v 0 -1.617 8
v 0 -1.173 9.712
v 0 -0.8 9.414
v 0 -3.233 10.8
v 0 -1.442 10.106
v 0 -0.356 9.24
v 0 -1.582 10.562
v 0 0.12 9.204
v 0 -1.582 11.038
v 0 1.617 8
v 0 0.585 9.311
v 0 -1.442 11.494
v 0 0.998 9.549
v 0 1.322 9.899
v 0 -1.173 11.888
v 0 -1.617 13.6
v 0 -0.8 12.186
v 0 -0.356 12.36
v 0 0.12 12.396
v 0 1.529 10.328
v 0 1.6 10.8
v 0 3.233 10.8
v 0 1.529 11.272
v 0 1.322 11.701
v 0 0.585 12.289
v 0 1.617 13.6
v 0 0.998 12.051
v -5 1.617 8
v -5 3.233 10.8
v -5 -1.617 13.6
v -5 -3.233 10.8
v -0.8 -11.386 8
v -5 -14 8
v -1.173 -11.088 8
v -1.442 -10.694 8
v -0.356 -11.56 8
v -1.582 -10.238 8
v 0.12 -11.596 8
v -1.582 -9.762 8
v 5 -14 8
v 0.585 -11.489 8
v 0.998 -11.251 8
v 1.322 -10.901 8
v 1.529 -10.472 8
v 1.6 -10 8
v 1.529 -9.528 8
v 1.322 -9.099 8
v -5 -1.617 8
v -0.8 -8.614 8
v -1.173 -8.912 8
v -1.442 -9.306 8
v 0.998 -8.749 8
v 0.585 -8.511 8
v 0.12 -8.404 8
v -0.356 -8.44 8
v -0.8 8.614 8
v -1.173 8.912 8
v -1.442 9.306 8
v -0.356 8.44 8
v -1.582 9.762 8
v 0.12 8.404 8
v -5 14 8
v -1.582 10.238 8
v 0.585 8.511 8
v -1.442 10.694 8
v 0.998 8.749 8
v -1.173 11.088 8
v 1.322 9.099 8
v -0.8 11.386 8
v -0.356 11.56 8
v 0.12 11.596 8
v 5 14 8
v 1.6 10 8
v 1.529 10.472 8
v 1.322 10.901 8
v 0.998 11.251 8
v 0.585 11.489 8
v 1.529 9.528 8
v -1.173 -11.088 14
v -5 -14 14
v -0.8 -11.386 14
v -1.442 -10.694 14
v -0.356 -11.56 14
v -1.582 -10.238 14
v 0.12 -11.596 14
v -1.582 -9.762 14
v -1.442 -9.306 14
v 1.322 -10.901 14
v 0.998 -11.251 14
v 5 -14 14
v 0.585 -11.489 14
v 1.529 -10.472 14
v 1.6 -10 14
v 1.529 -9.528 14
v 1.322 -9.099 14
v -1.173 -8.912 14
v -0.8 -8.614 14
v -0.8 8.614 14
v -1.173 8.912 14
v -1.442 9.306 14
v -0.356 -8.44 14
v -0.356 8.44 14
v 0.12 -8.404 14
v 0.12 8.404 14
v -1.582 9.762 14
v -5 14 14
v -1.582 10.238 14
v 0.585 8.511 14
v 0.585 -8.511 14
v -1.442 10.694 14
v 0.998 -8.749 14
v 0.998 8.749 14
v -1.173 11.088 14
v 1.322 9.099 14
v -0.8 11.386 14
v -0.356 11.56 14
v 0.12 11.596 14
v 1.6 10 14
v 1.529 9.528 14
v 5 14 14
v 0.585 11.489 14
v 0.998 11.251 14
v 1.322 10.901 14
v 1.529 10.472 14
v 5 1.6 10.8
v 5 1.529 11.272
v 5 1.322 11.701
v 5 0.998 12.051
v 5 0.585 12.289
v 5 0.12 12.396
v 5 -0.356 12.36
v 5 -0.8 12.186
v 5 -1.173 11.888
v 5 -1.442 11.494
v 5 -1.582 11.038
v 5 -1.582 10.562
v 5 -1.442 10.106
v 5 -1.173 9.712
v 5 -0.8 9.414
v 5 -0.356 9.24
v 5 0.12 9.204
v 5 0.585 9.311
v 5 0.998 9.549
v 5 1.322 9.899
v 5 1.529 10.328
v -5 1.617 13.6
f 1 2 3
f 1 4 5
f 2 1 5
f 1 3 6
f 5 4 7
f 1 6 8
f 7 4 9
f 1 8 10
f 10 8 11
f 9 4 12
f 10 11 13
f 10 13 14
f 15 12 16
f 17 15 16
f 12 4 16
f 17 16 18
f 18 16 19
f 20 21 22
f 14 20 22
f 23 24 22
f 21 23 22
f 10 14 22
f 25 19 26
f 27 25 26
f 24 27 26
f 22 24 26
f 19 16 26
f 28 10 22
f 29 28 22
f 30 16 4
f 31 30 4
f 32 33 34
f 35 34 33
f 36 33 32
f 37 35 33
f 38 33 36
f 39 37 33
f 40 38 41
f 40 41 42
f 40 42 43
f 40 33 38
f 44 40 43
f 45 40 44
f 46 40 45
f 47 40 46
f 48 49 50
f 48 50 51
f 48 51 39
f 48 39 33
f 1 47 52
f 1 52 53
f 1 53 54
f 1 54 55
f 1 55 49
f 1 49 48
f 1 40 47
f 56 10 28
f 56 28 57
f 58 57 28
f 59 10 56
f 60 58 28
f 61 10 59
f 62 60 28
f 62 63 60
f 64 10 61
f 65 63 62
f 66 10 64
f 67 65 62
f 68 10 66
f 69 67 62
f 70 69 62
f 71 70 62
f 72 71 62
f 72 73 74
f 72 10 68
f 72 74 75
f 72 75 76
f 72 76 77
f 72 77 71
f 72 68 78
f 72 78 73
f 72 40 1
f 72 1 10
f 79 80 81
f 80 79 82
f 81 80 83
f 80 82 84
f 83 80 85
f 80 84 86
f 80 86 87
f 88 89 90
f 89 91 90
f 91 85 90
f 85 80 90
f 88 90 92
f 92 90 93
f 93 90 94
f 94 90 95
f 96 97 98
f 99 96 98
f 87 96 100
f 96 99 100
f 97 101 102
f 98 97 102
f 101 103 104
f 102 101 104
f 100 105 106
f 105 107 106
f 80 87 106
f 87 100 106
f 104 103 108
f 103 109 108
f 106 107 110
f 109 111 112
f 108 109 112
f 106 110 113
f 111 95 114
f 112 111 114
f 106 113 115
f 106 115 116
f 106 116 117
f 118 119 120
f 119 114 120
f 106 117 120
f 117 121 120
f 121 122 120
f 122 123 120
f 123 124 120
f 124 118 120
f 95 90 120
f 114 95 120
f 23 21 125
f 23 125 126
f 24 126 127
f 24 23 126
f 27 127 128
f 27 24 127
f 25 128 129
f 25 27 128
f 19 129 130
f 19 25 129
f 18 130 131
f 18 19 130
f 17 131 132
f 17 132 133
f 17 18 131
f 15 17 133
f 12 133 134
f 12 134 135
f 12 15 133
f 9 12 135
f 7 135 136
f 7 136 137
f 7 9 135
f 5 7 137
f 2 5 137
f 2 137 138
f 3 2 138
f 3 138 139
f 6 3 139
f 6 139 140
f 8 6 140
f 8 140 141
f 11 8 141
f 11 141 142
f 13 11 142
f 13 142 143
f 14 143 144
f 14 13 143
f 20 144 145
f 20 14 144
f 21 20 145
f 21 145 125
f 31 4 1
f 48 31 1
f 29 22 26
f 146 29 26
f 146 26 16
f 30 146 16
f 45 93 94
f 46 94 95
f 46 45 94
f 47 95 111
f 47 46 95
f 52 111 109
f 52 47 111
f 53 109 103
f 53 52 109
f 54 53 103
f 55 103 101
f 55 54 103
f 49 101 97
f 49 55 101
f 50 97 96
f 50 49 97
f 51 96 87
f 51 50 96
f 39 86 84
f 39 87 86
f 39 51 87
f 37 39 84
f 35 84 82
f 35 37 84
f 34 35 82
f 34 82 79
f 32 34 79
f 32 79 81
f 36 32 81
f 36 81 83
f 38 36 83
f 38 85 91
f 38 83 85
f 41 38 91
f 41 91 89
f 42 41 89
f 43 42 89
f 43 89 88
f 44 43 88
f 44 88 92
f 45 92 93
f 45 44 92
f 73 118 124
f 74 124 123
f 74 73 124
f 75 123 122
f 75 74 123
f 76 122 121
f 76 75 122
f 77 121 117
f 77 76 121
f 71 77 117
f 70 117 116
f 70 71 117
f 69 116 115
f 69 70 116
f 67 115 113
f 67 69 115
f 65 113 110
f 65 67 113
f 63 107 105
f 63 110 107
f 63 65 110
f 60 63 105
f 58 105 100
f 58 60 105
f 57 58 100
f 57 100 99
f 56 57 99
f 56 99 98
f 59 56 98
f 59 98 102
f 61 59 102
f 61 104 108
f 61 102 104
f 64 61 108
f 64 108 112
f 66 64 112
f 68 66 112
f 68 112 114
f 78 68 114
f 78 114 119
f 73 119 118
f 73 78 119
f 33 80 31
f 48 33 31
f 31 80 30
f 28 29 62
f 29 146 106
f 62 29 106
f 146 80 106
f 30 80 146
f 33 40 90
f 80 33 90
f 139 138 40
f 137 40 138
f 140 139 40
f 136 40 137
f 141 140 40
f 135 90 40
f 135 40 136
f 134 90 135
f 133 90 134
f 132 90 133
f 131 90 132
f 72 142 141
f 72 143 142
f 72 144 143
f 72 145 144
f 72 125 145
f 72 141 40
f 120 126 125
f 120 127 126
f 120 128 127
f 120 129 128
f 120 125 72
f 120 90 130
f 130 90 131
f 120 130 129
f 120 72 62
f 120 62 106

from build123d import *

# Parameters (mm, degrees)
SKETCH_W        = 28
SKETCH_H        = 6
SKETCH_R        = 1.6
PAD_DEPTH       = 5
POCKET_DEPTH    = 5.001
SKETCH007_R     = 1.6
POCKET001_DEPTH = 6.001


with BuildPart() as part:
    # Sketch → Pad (new body, symmetric)
    with BuildSketch(Plane.YZ):
        with Locations((0, 3)):
            Rectangle(SKETCH_W, SKETCH_H)
        with Locations((0, 2.8)):
            Circle(SKETCH_R, mode=Mode.SUBTRACT)
    extrude(amount=PAD_DEPTH, both=True)

    # Sketch006 → Pocket (cut, through all)
    with BuildSketch(Plane.YZ):
        Polygon((1.616581, 0), (3.233162, 2.8), (1.616581, 5.6), (-1.616581, 5.6), (-3.233162, 2.8), (-1.616581, 0), align=None)
    extrude(amount=-POCKET_DEPTH, mode=Mode.SUBTRACT)

    # Sketch007 → Pocket001 (cut, through all)
    with BuildSketch(Plane.XY):
        with Locations((0, 10)):
            Circle(SKETCH007_R)
        with Locations((0, -10)):
            Circle(SKETCH007_R)
    extrude(amount=POCKET001_DEPTH, mode=Mode.SUBTRACT)


with BuildPart() as part_1:
    # Body002 placement: moved
    add(part.part.moved(Location((0, 0, 8))))


solid = part_1.part
